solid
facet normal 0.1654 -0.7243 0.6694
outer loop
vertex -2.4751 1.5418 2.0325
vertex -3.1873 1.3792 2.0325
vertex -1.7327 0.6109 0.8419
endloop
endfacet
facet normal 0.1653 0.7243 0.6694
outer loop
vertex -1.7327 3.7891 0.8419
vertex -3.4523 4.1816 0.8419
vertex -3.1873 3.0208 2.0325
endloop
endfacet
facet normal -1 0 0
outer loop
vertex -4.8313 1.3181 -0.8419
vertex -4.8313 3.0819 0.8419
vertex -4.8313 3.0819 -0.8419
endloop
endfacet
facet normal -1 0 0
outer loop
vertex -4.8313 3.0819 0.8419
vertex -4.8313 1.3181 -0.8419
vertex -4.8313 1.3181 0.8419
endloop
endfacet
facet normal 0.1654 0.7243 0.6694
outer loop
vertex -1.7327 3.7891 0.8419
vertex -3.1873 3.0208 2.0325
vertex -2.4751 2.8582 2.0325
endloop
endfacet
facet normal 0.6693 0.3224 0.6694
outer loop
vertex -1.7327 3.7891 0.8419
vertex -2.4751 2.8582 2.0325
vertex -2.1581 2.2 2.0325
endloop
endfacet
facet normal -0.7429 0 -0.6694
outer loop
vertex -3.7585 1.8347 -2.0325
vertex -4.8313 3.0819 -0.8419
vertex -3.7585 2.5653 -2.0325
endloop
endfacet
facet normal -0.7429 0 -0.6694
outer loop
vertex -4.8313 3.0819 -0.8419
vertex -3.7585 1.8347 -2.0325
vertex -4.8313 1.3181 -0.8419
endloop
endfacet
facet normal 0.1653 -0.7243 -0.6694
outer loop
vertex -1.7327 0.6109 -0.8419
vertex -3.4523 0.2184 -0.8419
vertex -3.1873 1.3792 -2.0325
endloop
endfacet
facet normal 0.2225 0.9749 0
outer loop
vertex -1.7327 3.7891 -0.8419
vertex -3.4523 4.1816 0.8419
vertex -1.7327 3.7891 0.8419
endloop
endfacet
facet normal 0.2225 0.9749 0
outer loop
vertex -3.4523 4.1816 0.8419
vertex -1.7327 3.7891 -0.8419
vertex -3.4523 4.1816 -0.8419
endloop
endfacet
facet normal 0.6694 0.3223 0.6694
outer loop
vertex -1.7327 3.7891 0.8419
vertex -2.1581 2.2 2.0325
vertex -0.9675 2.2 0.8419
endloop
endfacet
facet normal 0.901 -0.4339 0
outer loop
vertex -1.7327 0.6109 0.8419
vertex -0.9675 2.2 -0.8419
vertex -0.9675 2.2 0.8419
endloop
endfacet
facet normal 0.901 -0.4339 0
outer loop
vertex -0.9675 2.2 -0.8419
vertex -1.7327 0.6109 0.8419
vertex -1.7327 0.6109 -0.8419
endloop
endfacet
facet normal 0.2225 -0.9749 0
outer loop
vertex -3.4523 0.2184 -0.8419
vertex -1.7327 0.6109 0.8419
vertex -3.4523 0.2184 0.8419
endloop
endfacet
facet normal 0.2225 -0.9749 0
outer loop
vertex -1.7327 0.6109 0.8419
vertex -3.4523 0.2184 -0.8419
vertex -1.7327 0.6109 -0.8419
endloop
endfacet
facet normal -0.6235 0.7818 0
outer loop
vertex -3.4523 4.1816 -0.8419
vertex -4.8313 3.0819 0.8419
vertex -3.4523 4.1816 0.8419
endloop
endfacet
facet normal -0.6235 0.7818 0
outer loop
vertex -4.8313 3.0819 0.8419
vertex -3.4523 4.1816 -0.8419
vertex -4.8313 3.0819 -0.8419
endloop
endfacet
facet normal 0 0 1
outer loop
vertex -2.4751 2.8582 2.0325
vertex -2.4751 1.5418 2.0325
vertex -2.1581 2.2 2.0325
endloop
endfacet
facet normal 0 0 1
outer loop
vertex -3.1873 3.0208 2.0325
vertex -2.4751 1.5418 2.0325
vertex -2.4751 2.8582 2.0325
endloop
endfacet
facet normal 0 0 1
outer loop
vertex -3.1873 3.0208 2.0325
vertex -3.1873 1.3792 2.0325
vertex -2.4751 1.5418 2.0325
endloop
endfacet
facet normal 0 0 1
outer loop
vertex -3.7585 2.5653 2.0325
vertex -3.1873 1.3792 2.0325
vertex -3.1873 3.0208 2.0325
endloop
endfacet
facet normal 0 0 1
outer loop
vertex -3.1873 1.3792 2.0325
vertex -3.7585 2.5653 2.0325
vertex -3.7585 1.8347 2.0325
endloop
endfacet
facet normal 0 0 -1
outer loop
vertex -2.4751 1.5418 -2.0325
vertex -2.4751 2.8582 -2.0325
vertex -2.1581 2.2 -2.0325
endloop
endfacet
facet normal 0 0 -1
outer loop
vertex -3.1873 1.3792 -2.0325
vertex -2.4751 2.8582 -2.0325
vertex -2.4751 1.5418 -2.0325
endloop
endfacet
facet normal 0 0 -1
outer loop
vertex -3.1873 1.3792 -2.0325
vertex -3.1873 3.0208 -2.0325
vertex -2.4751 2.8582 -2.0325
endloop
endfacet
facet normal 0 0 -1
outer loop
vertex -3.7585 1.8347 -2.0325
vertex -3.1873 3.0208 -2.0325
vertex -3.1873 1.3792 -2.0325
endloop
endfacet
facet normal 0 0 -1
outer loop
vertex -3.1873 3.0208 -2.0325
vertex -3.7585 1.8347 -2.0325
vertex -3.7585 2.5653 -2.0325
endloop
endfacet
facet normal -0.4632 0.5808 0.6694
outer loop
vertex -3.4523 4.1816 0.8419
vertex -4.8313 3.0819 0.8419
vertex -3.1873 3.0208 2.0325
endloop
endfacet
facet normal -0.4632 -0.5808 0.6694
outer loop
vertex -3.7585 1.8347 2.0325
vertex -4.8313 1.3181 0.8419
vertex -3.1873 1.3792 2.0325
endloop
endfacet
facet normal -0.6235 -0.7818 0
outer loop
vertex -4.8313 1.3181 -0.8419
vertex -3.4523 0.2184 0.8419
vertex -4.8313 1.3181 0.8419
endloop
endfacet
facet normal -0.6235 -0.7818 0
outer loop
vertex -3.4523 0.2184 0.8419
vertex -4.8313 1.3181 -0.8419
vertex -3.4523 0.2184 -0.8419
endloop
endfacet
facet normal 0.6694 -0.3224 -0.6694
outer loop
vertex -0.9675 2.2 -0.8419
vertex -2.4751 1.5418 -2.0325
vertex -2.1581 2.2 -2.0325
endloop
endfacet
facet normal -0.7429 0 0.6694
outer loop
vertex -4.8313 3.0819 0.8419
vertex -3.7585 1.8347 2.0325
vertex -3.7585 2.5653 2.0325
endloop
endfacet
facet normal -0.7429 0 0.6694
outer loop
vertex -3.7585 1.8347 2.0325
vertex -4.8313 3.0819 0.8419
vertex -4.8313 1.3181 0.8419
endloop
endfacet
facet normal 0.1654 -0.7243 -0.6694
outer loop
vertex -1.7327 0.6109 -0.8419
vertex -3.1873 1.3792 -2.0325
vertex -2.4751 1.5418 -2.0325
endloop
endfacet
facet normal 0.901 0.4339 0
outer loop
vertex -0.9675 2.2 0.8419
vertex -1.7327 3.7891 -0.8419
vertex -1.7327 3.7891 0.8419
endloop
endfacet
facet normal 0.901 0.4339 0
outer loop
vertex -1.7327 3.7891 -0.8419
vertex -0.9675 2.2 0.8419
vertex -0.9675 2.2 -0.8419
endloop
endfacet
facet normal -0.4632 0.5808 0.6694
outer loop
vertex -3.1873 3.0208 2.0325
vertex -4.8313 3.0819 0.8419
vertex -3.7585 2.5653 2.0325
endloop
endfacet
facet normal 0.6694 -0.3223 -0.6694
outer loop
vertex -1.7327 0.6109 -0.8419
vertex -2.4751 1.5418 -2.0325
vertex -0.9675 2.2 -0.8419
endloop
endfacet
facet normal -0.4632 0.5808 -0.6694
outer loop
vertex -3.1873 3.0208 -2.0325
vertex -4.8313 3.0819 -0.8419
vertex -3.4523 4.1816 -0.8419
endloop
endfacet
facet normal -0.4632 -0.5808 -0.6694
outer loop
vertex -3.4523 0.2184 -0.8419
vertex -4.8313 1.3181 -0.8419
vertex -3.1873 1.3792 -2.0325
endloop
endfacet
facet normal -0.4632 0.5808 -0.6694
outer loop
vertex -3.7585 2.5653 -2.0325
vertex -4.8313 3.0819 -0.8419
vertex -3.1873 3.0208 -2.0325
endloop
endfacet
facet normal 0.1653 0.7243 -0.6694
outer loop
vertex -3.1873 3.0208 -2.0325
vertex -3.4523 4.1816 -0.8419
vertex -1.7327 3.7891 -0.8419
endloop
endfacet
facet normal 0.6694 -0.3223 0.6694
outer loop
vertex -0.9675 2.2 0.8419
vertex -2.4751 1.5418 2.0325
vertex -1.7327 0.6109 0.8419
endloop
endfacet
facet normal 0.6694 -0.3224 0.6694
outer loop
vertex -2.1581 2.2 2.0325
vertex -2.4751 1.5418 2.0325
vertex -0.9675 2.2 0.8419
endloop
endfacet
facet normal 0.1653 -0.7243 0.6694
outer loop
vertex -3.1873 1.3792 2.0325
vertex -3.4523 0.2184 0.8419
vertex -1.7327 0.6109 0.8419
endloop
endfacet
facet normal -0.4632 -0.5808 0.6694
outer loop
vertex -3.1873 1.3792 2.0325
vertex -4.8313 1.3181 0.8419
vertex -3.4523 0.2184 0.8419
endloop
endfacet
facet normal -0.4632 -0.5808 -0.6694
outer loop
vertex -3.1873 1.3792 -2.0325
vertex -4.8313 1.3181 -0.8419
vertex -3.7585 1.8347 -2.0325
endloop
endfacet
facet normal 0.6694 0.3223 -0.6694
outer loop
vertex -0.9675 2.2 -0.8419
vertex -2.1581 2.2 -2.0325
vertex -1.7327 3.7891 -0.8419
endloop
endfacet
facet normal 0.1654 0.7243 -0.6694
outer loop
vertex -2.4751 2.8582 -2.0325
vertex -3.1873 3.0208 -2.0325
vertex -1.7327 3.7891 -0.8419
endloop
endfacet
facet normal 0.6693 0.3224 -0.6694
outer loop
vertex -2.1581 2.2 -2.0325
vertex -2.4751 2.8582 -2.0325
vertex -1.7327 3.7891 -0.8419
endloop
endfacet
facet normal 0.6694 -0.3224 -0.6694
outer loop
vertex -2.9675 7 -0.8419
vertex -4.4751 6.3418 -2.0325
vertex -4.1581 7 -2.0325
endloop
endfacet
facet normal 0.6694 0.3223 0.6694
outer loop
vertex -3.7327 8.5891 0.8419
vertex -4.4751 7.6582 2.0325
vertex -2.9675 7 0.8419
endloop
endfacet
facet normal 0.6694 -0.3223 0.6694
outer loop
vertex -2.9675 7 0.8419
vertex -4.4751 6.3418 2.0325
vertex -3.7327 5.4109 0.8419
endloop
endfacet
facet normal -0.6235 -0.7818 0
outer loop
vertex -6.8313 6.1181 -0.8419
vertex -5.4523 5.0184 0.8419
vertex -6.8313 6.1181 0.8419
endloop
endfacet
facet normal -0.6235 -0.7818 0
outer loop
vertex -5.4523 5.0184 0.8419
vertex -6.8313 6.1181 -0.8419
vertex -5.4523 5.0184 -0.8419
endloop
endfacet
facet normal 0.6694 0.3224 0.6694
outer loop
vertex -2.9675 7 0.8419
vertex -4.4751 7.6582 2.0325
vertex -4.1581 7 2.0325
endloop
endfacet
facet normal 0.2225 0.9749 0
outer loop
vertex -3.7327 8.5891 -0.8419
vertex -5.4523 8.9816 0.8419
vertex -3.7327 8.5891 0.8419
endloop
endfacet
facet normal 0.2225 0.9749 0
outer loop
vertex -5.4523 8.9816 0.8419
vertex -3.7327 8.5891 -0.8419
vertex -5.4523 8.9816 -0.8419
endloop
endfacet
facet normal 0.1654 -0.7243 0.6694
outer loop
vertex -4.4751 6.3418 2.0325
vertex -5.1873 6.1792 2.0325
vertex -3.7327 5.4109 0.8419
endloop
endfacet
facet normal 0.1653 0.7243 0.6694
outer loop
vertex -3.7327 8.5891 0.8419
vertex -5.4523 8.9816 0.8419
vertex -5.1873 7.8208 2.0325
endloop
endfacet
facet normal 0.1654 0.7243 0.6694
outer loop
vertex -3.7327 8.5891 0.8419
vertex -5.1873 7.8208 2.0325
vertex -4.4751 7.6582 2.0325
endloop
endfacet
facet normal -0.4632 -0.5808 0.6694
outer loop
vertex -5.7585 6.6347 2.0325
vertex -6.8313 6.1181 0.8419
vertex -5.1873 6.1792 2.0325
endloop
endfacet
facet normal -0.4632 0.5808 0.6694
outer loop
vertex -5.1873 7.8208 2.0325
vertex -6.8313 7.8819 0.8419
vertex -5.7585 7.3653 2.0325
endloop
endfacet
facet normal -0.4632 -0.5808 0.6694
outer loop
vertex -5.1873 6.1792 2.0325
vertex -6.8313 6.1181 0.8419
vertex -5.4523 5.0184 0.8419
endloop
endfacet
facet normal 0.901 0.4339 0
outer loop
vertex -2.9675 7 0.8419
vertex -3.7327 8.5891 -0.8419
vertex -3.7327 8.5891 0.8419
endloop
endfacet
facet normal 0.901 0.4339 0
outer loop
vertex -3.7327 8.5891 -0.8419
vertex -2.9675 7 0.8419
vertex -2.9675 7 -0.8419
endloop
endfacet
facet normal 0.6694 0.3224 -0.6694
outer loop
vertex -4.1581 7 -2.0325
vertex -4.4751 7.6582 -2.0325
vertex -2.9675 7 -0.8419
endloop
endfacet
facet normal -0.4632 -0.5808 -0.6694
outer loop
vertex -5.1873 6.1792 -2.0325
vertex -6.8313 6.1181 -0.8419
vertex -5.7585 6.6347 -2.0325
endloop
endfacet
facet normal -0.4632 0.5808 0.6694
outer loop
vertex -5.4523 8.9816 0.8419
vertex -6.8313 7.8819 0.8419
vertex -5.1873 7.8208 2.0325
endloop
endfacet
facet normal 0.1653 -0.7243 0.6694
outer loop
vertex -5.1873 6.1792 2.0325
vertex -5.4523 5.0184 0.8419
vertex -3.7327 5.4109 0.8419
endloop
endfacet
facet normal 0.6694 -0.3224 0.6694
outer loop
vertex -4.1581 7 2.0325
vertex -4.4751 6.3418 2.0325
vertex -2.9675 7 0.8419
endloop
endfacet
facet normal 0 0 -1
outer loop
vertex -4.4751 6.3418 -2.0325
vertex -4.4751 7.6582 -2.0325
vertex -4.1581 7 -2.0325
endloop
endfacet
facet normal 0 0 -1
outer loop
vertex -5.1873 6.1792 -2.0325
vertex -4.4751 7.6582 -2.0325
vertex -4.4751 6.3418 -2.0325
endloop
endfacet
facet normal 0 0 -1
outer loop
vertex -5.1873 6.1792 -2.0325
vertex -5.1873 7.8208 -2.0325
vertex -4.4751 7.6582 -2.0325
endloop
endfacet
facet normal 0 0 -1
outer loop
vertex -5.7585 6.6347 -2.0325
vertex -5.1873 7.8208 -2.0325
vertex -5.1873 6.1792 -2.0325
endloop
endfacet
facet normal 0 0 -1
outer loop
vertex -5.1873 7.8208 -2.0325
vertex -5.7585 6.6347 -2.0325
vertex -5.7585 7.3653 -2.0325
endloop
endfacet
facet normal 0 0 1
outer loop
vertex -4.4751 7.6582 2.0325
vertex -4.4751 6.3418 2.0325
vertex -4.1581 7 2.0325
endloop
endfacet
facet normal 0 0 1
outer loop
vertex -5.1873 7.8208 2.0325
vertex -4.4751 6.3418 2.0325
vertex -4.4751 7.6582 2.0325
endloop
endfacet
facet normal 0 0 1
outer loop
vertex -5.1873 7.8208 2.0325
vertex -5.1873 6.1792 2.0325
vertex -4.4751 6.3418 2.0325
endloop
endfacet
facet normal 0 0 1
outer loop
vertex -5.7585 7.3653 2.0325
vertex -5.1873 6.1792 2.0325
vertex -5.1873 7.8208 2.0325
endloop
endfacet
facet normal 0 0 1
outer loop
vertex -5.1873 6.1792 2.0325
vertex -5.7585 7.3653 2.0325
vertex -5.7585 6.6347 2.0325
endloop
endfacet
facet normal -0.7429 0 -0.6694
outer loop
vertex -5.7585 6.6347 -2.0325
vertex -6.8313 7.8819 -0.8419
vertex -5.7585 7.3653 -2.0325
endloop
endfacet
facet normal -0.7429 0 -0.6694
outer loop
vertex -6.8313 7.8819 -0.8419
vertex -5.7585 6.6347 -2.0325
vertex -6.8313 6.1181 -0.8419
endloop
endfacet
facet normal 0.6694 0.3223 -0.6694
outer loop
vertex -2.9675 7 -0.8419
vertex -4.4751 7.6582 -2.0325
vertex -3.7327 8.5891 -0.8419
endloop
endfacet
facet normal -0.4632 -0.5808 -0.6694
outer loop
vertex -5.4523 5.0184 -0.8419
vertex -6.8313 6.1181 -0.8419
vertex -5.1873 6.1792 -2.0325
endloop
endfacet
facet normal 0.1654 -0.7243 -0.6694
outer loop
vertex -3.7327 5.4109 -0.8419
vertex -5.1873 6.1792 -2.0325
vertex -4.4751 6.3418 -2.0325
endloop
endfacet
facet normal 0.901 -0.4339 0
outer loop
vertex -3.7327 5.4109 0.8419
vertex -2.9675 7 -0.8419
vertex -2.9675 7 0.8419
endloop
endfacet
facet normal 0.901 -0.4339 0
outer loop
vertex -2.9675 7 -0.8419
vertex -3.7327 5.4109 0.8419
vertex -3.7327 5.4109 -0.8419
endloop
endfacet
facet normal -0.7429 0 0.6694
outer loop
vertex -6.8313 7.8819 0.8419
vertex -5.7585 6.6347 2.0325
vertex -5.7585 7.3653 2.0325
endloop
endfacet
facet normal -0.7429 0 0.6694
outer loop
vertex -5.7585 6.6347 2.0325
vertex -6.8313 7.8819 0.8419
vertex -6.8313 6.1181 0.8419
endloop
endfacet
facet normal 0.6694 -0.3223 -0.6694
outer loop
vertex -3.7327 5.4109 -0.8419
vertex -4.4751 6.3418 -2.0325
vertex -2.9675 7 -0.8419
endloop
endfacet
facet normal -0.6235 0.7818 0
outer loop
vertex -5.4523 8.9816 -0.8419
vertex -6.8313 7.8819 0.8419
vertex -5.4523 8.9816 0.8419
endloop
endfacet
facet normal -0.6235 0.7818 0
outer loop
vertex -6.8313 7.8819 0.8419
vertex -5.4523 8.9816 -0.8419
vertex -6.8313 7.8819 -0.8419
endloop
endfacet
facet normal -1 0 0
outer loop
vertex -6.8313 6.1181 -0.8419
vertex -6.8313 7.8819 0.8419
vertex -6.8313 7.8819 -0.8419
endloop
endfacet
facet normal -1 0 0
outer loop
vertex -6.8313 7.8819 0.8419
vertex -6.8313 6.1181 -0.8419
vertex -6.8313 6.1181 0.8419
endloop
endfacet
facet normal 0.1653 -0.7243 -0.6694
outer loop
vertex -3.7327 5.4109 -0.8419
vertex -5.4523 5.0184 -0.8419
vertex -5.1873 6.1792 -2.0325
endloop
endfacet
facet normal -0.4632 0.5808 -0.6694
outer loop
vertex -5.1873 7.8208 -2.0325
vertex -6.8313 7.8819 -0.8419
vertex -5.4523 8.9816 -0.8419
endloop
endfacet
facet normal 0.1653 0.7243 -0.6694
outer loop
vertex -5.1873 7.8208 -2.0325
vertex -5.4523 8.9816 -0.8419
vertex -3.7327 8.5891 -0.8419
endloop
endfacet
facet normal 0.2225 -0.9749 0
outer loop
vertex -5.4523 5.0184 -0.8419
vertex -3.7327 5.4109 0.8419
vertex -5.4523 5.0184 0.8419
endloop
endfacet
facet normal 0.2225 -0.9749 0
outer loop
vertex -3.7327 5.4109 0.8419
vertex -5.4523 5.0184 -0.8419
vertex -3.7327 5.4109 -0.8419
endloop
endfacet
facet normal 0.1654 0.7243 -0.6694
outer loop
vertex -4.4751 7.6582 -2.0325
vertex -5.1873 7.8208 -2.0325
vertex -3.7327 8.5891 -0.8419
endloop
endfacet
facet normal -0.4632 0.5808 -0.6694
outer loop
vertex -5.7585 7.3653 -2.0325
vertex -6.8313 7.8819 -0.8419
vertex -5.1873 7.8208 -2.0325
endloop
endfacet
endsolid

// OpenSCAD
   translate([-9,0]) {translate([6,2.2]) { color("blue") sphere(2.2);  }
   translate([4,7]) { color("red")  sphere(2.2); }
    text("S");}
   translate([3,0]) {rotate(90) scale(0.33,1,1) { text("CAD"); };}
   translate([-8.5,-2.4]) { scale(0.26,5,5) {text("inspect");}}
